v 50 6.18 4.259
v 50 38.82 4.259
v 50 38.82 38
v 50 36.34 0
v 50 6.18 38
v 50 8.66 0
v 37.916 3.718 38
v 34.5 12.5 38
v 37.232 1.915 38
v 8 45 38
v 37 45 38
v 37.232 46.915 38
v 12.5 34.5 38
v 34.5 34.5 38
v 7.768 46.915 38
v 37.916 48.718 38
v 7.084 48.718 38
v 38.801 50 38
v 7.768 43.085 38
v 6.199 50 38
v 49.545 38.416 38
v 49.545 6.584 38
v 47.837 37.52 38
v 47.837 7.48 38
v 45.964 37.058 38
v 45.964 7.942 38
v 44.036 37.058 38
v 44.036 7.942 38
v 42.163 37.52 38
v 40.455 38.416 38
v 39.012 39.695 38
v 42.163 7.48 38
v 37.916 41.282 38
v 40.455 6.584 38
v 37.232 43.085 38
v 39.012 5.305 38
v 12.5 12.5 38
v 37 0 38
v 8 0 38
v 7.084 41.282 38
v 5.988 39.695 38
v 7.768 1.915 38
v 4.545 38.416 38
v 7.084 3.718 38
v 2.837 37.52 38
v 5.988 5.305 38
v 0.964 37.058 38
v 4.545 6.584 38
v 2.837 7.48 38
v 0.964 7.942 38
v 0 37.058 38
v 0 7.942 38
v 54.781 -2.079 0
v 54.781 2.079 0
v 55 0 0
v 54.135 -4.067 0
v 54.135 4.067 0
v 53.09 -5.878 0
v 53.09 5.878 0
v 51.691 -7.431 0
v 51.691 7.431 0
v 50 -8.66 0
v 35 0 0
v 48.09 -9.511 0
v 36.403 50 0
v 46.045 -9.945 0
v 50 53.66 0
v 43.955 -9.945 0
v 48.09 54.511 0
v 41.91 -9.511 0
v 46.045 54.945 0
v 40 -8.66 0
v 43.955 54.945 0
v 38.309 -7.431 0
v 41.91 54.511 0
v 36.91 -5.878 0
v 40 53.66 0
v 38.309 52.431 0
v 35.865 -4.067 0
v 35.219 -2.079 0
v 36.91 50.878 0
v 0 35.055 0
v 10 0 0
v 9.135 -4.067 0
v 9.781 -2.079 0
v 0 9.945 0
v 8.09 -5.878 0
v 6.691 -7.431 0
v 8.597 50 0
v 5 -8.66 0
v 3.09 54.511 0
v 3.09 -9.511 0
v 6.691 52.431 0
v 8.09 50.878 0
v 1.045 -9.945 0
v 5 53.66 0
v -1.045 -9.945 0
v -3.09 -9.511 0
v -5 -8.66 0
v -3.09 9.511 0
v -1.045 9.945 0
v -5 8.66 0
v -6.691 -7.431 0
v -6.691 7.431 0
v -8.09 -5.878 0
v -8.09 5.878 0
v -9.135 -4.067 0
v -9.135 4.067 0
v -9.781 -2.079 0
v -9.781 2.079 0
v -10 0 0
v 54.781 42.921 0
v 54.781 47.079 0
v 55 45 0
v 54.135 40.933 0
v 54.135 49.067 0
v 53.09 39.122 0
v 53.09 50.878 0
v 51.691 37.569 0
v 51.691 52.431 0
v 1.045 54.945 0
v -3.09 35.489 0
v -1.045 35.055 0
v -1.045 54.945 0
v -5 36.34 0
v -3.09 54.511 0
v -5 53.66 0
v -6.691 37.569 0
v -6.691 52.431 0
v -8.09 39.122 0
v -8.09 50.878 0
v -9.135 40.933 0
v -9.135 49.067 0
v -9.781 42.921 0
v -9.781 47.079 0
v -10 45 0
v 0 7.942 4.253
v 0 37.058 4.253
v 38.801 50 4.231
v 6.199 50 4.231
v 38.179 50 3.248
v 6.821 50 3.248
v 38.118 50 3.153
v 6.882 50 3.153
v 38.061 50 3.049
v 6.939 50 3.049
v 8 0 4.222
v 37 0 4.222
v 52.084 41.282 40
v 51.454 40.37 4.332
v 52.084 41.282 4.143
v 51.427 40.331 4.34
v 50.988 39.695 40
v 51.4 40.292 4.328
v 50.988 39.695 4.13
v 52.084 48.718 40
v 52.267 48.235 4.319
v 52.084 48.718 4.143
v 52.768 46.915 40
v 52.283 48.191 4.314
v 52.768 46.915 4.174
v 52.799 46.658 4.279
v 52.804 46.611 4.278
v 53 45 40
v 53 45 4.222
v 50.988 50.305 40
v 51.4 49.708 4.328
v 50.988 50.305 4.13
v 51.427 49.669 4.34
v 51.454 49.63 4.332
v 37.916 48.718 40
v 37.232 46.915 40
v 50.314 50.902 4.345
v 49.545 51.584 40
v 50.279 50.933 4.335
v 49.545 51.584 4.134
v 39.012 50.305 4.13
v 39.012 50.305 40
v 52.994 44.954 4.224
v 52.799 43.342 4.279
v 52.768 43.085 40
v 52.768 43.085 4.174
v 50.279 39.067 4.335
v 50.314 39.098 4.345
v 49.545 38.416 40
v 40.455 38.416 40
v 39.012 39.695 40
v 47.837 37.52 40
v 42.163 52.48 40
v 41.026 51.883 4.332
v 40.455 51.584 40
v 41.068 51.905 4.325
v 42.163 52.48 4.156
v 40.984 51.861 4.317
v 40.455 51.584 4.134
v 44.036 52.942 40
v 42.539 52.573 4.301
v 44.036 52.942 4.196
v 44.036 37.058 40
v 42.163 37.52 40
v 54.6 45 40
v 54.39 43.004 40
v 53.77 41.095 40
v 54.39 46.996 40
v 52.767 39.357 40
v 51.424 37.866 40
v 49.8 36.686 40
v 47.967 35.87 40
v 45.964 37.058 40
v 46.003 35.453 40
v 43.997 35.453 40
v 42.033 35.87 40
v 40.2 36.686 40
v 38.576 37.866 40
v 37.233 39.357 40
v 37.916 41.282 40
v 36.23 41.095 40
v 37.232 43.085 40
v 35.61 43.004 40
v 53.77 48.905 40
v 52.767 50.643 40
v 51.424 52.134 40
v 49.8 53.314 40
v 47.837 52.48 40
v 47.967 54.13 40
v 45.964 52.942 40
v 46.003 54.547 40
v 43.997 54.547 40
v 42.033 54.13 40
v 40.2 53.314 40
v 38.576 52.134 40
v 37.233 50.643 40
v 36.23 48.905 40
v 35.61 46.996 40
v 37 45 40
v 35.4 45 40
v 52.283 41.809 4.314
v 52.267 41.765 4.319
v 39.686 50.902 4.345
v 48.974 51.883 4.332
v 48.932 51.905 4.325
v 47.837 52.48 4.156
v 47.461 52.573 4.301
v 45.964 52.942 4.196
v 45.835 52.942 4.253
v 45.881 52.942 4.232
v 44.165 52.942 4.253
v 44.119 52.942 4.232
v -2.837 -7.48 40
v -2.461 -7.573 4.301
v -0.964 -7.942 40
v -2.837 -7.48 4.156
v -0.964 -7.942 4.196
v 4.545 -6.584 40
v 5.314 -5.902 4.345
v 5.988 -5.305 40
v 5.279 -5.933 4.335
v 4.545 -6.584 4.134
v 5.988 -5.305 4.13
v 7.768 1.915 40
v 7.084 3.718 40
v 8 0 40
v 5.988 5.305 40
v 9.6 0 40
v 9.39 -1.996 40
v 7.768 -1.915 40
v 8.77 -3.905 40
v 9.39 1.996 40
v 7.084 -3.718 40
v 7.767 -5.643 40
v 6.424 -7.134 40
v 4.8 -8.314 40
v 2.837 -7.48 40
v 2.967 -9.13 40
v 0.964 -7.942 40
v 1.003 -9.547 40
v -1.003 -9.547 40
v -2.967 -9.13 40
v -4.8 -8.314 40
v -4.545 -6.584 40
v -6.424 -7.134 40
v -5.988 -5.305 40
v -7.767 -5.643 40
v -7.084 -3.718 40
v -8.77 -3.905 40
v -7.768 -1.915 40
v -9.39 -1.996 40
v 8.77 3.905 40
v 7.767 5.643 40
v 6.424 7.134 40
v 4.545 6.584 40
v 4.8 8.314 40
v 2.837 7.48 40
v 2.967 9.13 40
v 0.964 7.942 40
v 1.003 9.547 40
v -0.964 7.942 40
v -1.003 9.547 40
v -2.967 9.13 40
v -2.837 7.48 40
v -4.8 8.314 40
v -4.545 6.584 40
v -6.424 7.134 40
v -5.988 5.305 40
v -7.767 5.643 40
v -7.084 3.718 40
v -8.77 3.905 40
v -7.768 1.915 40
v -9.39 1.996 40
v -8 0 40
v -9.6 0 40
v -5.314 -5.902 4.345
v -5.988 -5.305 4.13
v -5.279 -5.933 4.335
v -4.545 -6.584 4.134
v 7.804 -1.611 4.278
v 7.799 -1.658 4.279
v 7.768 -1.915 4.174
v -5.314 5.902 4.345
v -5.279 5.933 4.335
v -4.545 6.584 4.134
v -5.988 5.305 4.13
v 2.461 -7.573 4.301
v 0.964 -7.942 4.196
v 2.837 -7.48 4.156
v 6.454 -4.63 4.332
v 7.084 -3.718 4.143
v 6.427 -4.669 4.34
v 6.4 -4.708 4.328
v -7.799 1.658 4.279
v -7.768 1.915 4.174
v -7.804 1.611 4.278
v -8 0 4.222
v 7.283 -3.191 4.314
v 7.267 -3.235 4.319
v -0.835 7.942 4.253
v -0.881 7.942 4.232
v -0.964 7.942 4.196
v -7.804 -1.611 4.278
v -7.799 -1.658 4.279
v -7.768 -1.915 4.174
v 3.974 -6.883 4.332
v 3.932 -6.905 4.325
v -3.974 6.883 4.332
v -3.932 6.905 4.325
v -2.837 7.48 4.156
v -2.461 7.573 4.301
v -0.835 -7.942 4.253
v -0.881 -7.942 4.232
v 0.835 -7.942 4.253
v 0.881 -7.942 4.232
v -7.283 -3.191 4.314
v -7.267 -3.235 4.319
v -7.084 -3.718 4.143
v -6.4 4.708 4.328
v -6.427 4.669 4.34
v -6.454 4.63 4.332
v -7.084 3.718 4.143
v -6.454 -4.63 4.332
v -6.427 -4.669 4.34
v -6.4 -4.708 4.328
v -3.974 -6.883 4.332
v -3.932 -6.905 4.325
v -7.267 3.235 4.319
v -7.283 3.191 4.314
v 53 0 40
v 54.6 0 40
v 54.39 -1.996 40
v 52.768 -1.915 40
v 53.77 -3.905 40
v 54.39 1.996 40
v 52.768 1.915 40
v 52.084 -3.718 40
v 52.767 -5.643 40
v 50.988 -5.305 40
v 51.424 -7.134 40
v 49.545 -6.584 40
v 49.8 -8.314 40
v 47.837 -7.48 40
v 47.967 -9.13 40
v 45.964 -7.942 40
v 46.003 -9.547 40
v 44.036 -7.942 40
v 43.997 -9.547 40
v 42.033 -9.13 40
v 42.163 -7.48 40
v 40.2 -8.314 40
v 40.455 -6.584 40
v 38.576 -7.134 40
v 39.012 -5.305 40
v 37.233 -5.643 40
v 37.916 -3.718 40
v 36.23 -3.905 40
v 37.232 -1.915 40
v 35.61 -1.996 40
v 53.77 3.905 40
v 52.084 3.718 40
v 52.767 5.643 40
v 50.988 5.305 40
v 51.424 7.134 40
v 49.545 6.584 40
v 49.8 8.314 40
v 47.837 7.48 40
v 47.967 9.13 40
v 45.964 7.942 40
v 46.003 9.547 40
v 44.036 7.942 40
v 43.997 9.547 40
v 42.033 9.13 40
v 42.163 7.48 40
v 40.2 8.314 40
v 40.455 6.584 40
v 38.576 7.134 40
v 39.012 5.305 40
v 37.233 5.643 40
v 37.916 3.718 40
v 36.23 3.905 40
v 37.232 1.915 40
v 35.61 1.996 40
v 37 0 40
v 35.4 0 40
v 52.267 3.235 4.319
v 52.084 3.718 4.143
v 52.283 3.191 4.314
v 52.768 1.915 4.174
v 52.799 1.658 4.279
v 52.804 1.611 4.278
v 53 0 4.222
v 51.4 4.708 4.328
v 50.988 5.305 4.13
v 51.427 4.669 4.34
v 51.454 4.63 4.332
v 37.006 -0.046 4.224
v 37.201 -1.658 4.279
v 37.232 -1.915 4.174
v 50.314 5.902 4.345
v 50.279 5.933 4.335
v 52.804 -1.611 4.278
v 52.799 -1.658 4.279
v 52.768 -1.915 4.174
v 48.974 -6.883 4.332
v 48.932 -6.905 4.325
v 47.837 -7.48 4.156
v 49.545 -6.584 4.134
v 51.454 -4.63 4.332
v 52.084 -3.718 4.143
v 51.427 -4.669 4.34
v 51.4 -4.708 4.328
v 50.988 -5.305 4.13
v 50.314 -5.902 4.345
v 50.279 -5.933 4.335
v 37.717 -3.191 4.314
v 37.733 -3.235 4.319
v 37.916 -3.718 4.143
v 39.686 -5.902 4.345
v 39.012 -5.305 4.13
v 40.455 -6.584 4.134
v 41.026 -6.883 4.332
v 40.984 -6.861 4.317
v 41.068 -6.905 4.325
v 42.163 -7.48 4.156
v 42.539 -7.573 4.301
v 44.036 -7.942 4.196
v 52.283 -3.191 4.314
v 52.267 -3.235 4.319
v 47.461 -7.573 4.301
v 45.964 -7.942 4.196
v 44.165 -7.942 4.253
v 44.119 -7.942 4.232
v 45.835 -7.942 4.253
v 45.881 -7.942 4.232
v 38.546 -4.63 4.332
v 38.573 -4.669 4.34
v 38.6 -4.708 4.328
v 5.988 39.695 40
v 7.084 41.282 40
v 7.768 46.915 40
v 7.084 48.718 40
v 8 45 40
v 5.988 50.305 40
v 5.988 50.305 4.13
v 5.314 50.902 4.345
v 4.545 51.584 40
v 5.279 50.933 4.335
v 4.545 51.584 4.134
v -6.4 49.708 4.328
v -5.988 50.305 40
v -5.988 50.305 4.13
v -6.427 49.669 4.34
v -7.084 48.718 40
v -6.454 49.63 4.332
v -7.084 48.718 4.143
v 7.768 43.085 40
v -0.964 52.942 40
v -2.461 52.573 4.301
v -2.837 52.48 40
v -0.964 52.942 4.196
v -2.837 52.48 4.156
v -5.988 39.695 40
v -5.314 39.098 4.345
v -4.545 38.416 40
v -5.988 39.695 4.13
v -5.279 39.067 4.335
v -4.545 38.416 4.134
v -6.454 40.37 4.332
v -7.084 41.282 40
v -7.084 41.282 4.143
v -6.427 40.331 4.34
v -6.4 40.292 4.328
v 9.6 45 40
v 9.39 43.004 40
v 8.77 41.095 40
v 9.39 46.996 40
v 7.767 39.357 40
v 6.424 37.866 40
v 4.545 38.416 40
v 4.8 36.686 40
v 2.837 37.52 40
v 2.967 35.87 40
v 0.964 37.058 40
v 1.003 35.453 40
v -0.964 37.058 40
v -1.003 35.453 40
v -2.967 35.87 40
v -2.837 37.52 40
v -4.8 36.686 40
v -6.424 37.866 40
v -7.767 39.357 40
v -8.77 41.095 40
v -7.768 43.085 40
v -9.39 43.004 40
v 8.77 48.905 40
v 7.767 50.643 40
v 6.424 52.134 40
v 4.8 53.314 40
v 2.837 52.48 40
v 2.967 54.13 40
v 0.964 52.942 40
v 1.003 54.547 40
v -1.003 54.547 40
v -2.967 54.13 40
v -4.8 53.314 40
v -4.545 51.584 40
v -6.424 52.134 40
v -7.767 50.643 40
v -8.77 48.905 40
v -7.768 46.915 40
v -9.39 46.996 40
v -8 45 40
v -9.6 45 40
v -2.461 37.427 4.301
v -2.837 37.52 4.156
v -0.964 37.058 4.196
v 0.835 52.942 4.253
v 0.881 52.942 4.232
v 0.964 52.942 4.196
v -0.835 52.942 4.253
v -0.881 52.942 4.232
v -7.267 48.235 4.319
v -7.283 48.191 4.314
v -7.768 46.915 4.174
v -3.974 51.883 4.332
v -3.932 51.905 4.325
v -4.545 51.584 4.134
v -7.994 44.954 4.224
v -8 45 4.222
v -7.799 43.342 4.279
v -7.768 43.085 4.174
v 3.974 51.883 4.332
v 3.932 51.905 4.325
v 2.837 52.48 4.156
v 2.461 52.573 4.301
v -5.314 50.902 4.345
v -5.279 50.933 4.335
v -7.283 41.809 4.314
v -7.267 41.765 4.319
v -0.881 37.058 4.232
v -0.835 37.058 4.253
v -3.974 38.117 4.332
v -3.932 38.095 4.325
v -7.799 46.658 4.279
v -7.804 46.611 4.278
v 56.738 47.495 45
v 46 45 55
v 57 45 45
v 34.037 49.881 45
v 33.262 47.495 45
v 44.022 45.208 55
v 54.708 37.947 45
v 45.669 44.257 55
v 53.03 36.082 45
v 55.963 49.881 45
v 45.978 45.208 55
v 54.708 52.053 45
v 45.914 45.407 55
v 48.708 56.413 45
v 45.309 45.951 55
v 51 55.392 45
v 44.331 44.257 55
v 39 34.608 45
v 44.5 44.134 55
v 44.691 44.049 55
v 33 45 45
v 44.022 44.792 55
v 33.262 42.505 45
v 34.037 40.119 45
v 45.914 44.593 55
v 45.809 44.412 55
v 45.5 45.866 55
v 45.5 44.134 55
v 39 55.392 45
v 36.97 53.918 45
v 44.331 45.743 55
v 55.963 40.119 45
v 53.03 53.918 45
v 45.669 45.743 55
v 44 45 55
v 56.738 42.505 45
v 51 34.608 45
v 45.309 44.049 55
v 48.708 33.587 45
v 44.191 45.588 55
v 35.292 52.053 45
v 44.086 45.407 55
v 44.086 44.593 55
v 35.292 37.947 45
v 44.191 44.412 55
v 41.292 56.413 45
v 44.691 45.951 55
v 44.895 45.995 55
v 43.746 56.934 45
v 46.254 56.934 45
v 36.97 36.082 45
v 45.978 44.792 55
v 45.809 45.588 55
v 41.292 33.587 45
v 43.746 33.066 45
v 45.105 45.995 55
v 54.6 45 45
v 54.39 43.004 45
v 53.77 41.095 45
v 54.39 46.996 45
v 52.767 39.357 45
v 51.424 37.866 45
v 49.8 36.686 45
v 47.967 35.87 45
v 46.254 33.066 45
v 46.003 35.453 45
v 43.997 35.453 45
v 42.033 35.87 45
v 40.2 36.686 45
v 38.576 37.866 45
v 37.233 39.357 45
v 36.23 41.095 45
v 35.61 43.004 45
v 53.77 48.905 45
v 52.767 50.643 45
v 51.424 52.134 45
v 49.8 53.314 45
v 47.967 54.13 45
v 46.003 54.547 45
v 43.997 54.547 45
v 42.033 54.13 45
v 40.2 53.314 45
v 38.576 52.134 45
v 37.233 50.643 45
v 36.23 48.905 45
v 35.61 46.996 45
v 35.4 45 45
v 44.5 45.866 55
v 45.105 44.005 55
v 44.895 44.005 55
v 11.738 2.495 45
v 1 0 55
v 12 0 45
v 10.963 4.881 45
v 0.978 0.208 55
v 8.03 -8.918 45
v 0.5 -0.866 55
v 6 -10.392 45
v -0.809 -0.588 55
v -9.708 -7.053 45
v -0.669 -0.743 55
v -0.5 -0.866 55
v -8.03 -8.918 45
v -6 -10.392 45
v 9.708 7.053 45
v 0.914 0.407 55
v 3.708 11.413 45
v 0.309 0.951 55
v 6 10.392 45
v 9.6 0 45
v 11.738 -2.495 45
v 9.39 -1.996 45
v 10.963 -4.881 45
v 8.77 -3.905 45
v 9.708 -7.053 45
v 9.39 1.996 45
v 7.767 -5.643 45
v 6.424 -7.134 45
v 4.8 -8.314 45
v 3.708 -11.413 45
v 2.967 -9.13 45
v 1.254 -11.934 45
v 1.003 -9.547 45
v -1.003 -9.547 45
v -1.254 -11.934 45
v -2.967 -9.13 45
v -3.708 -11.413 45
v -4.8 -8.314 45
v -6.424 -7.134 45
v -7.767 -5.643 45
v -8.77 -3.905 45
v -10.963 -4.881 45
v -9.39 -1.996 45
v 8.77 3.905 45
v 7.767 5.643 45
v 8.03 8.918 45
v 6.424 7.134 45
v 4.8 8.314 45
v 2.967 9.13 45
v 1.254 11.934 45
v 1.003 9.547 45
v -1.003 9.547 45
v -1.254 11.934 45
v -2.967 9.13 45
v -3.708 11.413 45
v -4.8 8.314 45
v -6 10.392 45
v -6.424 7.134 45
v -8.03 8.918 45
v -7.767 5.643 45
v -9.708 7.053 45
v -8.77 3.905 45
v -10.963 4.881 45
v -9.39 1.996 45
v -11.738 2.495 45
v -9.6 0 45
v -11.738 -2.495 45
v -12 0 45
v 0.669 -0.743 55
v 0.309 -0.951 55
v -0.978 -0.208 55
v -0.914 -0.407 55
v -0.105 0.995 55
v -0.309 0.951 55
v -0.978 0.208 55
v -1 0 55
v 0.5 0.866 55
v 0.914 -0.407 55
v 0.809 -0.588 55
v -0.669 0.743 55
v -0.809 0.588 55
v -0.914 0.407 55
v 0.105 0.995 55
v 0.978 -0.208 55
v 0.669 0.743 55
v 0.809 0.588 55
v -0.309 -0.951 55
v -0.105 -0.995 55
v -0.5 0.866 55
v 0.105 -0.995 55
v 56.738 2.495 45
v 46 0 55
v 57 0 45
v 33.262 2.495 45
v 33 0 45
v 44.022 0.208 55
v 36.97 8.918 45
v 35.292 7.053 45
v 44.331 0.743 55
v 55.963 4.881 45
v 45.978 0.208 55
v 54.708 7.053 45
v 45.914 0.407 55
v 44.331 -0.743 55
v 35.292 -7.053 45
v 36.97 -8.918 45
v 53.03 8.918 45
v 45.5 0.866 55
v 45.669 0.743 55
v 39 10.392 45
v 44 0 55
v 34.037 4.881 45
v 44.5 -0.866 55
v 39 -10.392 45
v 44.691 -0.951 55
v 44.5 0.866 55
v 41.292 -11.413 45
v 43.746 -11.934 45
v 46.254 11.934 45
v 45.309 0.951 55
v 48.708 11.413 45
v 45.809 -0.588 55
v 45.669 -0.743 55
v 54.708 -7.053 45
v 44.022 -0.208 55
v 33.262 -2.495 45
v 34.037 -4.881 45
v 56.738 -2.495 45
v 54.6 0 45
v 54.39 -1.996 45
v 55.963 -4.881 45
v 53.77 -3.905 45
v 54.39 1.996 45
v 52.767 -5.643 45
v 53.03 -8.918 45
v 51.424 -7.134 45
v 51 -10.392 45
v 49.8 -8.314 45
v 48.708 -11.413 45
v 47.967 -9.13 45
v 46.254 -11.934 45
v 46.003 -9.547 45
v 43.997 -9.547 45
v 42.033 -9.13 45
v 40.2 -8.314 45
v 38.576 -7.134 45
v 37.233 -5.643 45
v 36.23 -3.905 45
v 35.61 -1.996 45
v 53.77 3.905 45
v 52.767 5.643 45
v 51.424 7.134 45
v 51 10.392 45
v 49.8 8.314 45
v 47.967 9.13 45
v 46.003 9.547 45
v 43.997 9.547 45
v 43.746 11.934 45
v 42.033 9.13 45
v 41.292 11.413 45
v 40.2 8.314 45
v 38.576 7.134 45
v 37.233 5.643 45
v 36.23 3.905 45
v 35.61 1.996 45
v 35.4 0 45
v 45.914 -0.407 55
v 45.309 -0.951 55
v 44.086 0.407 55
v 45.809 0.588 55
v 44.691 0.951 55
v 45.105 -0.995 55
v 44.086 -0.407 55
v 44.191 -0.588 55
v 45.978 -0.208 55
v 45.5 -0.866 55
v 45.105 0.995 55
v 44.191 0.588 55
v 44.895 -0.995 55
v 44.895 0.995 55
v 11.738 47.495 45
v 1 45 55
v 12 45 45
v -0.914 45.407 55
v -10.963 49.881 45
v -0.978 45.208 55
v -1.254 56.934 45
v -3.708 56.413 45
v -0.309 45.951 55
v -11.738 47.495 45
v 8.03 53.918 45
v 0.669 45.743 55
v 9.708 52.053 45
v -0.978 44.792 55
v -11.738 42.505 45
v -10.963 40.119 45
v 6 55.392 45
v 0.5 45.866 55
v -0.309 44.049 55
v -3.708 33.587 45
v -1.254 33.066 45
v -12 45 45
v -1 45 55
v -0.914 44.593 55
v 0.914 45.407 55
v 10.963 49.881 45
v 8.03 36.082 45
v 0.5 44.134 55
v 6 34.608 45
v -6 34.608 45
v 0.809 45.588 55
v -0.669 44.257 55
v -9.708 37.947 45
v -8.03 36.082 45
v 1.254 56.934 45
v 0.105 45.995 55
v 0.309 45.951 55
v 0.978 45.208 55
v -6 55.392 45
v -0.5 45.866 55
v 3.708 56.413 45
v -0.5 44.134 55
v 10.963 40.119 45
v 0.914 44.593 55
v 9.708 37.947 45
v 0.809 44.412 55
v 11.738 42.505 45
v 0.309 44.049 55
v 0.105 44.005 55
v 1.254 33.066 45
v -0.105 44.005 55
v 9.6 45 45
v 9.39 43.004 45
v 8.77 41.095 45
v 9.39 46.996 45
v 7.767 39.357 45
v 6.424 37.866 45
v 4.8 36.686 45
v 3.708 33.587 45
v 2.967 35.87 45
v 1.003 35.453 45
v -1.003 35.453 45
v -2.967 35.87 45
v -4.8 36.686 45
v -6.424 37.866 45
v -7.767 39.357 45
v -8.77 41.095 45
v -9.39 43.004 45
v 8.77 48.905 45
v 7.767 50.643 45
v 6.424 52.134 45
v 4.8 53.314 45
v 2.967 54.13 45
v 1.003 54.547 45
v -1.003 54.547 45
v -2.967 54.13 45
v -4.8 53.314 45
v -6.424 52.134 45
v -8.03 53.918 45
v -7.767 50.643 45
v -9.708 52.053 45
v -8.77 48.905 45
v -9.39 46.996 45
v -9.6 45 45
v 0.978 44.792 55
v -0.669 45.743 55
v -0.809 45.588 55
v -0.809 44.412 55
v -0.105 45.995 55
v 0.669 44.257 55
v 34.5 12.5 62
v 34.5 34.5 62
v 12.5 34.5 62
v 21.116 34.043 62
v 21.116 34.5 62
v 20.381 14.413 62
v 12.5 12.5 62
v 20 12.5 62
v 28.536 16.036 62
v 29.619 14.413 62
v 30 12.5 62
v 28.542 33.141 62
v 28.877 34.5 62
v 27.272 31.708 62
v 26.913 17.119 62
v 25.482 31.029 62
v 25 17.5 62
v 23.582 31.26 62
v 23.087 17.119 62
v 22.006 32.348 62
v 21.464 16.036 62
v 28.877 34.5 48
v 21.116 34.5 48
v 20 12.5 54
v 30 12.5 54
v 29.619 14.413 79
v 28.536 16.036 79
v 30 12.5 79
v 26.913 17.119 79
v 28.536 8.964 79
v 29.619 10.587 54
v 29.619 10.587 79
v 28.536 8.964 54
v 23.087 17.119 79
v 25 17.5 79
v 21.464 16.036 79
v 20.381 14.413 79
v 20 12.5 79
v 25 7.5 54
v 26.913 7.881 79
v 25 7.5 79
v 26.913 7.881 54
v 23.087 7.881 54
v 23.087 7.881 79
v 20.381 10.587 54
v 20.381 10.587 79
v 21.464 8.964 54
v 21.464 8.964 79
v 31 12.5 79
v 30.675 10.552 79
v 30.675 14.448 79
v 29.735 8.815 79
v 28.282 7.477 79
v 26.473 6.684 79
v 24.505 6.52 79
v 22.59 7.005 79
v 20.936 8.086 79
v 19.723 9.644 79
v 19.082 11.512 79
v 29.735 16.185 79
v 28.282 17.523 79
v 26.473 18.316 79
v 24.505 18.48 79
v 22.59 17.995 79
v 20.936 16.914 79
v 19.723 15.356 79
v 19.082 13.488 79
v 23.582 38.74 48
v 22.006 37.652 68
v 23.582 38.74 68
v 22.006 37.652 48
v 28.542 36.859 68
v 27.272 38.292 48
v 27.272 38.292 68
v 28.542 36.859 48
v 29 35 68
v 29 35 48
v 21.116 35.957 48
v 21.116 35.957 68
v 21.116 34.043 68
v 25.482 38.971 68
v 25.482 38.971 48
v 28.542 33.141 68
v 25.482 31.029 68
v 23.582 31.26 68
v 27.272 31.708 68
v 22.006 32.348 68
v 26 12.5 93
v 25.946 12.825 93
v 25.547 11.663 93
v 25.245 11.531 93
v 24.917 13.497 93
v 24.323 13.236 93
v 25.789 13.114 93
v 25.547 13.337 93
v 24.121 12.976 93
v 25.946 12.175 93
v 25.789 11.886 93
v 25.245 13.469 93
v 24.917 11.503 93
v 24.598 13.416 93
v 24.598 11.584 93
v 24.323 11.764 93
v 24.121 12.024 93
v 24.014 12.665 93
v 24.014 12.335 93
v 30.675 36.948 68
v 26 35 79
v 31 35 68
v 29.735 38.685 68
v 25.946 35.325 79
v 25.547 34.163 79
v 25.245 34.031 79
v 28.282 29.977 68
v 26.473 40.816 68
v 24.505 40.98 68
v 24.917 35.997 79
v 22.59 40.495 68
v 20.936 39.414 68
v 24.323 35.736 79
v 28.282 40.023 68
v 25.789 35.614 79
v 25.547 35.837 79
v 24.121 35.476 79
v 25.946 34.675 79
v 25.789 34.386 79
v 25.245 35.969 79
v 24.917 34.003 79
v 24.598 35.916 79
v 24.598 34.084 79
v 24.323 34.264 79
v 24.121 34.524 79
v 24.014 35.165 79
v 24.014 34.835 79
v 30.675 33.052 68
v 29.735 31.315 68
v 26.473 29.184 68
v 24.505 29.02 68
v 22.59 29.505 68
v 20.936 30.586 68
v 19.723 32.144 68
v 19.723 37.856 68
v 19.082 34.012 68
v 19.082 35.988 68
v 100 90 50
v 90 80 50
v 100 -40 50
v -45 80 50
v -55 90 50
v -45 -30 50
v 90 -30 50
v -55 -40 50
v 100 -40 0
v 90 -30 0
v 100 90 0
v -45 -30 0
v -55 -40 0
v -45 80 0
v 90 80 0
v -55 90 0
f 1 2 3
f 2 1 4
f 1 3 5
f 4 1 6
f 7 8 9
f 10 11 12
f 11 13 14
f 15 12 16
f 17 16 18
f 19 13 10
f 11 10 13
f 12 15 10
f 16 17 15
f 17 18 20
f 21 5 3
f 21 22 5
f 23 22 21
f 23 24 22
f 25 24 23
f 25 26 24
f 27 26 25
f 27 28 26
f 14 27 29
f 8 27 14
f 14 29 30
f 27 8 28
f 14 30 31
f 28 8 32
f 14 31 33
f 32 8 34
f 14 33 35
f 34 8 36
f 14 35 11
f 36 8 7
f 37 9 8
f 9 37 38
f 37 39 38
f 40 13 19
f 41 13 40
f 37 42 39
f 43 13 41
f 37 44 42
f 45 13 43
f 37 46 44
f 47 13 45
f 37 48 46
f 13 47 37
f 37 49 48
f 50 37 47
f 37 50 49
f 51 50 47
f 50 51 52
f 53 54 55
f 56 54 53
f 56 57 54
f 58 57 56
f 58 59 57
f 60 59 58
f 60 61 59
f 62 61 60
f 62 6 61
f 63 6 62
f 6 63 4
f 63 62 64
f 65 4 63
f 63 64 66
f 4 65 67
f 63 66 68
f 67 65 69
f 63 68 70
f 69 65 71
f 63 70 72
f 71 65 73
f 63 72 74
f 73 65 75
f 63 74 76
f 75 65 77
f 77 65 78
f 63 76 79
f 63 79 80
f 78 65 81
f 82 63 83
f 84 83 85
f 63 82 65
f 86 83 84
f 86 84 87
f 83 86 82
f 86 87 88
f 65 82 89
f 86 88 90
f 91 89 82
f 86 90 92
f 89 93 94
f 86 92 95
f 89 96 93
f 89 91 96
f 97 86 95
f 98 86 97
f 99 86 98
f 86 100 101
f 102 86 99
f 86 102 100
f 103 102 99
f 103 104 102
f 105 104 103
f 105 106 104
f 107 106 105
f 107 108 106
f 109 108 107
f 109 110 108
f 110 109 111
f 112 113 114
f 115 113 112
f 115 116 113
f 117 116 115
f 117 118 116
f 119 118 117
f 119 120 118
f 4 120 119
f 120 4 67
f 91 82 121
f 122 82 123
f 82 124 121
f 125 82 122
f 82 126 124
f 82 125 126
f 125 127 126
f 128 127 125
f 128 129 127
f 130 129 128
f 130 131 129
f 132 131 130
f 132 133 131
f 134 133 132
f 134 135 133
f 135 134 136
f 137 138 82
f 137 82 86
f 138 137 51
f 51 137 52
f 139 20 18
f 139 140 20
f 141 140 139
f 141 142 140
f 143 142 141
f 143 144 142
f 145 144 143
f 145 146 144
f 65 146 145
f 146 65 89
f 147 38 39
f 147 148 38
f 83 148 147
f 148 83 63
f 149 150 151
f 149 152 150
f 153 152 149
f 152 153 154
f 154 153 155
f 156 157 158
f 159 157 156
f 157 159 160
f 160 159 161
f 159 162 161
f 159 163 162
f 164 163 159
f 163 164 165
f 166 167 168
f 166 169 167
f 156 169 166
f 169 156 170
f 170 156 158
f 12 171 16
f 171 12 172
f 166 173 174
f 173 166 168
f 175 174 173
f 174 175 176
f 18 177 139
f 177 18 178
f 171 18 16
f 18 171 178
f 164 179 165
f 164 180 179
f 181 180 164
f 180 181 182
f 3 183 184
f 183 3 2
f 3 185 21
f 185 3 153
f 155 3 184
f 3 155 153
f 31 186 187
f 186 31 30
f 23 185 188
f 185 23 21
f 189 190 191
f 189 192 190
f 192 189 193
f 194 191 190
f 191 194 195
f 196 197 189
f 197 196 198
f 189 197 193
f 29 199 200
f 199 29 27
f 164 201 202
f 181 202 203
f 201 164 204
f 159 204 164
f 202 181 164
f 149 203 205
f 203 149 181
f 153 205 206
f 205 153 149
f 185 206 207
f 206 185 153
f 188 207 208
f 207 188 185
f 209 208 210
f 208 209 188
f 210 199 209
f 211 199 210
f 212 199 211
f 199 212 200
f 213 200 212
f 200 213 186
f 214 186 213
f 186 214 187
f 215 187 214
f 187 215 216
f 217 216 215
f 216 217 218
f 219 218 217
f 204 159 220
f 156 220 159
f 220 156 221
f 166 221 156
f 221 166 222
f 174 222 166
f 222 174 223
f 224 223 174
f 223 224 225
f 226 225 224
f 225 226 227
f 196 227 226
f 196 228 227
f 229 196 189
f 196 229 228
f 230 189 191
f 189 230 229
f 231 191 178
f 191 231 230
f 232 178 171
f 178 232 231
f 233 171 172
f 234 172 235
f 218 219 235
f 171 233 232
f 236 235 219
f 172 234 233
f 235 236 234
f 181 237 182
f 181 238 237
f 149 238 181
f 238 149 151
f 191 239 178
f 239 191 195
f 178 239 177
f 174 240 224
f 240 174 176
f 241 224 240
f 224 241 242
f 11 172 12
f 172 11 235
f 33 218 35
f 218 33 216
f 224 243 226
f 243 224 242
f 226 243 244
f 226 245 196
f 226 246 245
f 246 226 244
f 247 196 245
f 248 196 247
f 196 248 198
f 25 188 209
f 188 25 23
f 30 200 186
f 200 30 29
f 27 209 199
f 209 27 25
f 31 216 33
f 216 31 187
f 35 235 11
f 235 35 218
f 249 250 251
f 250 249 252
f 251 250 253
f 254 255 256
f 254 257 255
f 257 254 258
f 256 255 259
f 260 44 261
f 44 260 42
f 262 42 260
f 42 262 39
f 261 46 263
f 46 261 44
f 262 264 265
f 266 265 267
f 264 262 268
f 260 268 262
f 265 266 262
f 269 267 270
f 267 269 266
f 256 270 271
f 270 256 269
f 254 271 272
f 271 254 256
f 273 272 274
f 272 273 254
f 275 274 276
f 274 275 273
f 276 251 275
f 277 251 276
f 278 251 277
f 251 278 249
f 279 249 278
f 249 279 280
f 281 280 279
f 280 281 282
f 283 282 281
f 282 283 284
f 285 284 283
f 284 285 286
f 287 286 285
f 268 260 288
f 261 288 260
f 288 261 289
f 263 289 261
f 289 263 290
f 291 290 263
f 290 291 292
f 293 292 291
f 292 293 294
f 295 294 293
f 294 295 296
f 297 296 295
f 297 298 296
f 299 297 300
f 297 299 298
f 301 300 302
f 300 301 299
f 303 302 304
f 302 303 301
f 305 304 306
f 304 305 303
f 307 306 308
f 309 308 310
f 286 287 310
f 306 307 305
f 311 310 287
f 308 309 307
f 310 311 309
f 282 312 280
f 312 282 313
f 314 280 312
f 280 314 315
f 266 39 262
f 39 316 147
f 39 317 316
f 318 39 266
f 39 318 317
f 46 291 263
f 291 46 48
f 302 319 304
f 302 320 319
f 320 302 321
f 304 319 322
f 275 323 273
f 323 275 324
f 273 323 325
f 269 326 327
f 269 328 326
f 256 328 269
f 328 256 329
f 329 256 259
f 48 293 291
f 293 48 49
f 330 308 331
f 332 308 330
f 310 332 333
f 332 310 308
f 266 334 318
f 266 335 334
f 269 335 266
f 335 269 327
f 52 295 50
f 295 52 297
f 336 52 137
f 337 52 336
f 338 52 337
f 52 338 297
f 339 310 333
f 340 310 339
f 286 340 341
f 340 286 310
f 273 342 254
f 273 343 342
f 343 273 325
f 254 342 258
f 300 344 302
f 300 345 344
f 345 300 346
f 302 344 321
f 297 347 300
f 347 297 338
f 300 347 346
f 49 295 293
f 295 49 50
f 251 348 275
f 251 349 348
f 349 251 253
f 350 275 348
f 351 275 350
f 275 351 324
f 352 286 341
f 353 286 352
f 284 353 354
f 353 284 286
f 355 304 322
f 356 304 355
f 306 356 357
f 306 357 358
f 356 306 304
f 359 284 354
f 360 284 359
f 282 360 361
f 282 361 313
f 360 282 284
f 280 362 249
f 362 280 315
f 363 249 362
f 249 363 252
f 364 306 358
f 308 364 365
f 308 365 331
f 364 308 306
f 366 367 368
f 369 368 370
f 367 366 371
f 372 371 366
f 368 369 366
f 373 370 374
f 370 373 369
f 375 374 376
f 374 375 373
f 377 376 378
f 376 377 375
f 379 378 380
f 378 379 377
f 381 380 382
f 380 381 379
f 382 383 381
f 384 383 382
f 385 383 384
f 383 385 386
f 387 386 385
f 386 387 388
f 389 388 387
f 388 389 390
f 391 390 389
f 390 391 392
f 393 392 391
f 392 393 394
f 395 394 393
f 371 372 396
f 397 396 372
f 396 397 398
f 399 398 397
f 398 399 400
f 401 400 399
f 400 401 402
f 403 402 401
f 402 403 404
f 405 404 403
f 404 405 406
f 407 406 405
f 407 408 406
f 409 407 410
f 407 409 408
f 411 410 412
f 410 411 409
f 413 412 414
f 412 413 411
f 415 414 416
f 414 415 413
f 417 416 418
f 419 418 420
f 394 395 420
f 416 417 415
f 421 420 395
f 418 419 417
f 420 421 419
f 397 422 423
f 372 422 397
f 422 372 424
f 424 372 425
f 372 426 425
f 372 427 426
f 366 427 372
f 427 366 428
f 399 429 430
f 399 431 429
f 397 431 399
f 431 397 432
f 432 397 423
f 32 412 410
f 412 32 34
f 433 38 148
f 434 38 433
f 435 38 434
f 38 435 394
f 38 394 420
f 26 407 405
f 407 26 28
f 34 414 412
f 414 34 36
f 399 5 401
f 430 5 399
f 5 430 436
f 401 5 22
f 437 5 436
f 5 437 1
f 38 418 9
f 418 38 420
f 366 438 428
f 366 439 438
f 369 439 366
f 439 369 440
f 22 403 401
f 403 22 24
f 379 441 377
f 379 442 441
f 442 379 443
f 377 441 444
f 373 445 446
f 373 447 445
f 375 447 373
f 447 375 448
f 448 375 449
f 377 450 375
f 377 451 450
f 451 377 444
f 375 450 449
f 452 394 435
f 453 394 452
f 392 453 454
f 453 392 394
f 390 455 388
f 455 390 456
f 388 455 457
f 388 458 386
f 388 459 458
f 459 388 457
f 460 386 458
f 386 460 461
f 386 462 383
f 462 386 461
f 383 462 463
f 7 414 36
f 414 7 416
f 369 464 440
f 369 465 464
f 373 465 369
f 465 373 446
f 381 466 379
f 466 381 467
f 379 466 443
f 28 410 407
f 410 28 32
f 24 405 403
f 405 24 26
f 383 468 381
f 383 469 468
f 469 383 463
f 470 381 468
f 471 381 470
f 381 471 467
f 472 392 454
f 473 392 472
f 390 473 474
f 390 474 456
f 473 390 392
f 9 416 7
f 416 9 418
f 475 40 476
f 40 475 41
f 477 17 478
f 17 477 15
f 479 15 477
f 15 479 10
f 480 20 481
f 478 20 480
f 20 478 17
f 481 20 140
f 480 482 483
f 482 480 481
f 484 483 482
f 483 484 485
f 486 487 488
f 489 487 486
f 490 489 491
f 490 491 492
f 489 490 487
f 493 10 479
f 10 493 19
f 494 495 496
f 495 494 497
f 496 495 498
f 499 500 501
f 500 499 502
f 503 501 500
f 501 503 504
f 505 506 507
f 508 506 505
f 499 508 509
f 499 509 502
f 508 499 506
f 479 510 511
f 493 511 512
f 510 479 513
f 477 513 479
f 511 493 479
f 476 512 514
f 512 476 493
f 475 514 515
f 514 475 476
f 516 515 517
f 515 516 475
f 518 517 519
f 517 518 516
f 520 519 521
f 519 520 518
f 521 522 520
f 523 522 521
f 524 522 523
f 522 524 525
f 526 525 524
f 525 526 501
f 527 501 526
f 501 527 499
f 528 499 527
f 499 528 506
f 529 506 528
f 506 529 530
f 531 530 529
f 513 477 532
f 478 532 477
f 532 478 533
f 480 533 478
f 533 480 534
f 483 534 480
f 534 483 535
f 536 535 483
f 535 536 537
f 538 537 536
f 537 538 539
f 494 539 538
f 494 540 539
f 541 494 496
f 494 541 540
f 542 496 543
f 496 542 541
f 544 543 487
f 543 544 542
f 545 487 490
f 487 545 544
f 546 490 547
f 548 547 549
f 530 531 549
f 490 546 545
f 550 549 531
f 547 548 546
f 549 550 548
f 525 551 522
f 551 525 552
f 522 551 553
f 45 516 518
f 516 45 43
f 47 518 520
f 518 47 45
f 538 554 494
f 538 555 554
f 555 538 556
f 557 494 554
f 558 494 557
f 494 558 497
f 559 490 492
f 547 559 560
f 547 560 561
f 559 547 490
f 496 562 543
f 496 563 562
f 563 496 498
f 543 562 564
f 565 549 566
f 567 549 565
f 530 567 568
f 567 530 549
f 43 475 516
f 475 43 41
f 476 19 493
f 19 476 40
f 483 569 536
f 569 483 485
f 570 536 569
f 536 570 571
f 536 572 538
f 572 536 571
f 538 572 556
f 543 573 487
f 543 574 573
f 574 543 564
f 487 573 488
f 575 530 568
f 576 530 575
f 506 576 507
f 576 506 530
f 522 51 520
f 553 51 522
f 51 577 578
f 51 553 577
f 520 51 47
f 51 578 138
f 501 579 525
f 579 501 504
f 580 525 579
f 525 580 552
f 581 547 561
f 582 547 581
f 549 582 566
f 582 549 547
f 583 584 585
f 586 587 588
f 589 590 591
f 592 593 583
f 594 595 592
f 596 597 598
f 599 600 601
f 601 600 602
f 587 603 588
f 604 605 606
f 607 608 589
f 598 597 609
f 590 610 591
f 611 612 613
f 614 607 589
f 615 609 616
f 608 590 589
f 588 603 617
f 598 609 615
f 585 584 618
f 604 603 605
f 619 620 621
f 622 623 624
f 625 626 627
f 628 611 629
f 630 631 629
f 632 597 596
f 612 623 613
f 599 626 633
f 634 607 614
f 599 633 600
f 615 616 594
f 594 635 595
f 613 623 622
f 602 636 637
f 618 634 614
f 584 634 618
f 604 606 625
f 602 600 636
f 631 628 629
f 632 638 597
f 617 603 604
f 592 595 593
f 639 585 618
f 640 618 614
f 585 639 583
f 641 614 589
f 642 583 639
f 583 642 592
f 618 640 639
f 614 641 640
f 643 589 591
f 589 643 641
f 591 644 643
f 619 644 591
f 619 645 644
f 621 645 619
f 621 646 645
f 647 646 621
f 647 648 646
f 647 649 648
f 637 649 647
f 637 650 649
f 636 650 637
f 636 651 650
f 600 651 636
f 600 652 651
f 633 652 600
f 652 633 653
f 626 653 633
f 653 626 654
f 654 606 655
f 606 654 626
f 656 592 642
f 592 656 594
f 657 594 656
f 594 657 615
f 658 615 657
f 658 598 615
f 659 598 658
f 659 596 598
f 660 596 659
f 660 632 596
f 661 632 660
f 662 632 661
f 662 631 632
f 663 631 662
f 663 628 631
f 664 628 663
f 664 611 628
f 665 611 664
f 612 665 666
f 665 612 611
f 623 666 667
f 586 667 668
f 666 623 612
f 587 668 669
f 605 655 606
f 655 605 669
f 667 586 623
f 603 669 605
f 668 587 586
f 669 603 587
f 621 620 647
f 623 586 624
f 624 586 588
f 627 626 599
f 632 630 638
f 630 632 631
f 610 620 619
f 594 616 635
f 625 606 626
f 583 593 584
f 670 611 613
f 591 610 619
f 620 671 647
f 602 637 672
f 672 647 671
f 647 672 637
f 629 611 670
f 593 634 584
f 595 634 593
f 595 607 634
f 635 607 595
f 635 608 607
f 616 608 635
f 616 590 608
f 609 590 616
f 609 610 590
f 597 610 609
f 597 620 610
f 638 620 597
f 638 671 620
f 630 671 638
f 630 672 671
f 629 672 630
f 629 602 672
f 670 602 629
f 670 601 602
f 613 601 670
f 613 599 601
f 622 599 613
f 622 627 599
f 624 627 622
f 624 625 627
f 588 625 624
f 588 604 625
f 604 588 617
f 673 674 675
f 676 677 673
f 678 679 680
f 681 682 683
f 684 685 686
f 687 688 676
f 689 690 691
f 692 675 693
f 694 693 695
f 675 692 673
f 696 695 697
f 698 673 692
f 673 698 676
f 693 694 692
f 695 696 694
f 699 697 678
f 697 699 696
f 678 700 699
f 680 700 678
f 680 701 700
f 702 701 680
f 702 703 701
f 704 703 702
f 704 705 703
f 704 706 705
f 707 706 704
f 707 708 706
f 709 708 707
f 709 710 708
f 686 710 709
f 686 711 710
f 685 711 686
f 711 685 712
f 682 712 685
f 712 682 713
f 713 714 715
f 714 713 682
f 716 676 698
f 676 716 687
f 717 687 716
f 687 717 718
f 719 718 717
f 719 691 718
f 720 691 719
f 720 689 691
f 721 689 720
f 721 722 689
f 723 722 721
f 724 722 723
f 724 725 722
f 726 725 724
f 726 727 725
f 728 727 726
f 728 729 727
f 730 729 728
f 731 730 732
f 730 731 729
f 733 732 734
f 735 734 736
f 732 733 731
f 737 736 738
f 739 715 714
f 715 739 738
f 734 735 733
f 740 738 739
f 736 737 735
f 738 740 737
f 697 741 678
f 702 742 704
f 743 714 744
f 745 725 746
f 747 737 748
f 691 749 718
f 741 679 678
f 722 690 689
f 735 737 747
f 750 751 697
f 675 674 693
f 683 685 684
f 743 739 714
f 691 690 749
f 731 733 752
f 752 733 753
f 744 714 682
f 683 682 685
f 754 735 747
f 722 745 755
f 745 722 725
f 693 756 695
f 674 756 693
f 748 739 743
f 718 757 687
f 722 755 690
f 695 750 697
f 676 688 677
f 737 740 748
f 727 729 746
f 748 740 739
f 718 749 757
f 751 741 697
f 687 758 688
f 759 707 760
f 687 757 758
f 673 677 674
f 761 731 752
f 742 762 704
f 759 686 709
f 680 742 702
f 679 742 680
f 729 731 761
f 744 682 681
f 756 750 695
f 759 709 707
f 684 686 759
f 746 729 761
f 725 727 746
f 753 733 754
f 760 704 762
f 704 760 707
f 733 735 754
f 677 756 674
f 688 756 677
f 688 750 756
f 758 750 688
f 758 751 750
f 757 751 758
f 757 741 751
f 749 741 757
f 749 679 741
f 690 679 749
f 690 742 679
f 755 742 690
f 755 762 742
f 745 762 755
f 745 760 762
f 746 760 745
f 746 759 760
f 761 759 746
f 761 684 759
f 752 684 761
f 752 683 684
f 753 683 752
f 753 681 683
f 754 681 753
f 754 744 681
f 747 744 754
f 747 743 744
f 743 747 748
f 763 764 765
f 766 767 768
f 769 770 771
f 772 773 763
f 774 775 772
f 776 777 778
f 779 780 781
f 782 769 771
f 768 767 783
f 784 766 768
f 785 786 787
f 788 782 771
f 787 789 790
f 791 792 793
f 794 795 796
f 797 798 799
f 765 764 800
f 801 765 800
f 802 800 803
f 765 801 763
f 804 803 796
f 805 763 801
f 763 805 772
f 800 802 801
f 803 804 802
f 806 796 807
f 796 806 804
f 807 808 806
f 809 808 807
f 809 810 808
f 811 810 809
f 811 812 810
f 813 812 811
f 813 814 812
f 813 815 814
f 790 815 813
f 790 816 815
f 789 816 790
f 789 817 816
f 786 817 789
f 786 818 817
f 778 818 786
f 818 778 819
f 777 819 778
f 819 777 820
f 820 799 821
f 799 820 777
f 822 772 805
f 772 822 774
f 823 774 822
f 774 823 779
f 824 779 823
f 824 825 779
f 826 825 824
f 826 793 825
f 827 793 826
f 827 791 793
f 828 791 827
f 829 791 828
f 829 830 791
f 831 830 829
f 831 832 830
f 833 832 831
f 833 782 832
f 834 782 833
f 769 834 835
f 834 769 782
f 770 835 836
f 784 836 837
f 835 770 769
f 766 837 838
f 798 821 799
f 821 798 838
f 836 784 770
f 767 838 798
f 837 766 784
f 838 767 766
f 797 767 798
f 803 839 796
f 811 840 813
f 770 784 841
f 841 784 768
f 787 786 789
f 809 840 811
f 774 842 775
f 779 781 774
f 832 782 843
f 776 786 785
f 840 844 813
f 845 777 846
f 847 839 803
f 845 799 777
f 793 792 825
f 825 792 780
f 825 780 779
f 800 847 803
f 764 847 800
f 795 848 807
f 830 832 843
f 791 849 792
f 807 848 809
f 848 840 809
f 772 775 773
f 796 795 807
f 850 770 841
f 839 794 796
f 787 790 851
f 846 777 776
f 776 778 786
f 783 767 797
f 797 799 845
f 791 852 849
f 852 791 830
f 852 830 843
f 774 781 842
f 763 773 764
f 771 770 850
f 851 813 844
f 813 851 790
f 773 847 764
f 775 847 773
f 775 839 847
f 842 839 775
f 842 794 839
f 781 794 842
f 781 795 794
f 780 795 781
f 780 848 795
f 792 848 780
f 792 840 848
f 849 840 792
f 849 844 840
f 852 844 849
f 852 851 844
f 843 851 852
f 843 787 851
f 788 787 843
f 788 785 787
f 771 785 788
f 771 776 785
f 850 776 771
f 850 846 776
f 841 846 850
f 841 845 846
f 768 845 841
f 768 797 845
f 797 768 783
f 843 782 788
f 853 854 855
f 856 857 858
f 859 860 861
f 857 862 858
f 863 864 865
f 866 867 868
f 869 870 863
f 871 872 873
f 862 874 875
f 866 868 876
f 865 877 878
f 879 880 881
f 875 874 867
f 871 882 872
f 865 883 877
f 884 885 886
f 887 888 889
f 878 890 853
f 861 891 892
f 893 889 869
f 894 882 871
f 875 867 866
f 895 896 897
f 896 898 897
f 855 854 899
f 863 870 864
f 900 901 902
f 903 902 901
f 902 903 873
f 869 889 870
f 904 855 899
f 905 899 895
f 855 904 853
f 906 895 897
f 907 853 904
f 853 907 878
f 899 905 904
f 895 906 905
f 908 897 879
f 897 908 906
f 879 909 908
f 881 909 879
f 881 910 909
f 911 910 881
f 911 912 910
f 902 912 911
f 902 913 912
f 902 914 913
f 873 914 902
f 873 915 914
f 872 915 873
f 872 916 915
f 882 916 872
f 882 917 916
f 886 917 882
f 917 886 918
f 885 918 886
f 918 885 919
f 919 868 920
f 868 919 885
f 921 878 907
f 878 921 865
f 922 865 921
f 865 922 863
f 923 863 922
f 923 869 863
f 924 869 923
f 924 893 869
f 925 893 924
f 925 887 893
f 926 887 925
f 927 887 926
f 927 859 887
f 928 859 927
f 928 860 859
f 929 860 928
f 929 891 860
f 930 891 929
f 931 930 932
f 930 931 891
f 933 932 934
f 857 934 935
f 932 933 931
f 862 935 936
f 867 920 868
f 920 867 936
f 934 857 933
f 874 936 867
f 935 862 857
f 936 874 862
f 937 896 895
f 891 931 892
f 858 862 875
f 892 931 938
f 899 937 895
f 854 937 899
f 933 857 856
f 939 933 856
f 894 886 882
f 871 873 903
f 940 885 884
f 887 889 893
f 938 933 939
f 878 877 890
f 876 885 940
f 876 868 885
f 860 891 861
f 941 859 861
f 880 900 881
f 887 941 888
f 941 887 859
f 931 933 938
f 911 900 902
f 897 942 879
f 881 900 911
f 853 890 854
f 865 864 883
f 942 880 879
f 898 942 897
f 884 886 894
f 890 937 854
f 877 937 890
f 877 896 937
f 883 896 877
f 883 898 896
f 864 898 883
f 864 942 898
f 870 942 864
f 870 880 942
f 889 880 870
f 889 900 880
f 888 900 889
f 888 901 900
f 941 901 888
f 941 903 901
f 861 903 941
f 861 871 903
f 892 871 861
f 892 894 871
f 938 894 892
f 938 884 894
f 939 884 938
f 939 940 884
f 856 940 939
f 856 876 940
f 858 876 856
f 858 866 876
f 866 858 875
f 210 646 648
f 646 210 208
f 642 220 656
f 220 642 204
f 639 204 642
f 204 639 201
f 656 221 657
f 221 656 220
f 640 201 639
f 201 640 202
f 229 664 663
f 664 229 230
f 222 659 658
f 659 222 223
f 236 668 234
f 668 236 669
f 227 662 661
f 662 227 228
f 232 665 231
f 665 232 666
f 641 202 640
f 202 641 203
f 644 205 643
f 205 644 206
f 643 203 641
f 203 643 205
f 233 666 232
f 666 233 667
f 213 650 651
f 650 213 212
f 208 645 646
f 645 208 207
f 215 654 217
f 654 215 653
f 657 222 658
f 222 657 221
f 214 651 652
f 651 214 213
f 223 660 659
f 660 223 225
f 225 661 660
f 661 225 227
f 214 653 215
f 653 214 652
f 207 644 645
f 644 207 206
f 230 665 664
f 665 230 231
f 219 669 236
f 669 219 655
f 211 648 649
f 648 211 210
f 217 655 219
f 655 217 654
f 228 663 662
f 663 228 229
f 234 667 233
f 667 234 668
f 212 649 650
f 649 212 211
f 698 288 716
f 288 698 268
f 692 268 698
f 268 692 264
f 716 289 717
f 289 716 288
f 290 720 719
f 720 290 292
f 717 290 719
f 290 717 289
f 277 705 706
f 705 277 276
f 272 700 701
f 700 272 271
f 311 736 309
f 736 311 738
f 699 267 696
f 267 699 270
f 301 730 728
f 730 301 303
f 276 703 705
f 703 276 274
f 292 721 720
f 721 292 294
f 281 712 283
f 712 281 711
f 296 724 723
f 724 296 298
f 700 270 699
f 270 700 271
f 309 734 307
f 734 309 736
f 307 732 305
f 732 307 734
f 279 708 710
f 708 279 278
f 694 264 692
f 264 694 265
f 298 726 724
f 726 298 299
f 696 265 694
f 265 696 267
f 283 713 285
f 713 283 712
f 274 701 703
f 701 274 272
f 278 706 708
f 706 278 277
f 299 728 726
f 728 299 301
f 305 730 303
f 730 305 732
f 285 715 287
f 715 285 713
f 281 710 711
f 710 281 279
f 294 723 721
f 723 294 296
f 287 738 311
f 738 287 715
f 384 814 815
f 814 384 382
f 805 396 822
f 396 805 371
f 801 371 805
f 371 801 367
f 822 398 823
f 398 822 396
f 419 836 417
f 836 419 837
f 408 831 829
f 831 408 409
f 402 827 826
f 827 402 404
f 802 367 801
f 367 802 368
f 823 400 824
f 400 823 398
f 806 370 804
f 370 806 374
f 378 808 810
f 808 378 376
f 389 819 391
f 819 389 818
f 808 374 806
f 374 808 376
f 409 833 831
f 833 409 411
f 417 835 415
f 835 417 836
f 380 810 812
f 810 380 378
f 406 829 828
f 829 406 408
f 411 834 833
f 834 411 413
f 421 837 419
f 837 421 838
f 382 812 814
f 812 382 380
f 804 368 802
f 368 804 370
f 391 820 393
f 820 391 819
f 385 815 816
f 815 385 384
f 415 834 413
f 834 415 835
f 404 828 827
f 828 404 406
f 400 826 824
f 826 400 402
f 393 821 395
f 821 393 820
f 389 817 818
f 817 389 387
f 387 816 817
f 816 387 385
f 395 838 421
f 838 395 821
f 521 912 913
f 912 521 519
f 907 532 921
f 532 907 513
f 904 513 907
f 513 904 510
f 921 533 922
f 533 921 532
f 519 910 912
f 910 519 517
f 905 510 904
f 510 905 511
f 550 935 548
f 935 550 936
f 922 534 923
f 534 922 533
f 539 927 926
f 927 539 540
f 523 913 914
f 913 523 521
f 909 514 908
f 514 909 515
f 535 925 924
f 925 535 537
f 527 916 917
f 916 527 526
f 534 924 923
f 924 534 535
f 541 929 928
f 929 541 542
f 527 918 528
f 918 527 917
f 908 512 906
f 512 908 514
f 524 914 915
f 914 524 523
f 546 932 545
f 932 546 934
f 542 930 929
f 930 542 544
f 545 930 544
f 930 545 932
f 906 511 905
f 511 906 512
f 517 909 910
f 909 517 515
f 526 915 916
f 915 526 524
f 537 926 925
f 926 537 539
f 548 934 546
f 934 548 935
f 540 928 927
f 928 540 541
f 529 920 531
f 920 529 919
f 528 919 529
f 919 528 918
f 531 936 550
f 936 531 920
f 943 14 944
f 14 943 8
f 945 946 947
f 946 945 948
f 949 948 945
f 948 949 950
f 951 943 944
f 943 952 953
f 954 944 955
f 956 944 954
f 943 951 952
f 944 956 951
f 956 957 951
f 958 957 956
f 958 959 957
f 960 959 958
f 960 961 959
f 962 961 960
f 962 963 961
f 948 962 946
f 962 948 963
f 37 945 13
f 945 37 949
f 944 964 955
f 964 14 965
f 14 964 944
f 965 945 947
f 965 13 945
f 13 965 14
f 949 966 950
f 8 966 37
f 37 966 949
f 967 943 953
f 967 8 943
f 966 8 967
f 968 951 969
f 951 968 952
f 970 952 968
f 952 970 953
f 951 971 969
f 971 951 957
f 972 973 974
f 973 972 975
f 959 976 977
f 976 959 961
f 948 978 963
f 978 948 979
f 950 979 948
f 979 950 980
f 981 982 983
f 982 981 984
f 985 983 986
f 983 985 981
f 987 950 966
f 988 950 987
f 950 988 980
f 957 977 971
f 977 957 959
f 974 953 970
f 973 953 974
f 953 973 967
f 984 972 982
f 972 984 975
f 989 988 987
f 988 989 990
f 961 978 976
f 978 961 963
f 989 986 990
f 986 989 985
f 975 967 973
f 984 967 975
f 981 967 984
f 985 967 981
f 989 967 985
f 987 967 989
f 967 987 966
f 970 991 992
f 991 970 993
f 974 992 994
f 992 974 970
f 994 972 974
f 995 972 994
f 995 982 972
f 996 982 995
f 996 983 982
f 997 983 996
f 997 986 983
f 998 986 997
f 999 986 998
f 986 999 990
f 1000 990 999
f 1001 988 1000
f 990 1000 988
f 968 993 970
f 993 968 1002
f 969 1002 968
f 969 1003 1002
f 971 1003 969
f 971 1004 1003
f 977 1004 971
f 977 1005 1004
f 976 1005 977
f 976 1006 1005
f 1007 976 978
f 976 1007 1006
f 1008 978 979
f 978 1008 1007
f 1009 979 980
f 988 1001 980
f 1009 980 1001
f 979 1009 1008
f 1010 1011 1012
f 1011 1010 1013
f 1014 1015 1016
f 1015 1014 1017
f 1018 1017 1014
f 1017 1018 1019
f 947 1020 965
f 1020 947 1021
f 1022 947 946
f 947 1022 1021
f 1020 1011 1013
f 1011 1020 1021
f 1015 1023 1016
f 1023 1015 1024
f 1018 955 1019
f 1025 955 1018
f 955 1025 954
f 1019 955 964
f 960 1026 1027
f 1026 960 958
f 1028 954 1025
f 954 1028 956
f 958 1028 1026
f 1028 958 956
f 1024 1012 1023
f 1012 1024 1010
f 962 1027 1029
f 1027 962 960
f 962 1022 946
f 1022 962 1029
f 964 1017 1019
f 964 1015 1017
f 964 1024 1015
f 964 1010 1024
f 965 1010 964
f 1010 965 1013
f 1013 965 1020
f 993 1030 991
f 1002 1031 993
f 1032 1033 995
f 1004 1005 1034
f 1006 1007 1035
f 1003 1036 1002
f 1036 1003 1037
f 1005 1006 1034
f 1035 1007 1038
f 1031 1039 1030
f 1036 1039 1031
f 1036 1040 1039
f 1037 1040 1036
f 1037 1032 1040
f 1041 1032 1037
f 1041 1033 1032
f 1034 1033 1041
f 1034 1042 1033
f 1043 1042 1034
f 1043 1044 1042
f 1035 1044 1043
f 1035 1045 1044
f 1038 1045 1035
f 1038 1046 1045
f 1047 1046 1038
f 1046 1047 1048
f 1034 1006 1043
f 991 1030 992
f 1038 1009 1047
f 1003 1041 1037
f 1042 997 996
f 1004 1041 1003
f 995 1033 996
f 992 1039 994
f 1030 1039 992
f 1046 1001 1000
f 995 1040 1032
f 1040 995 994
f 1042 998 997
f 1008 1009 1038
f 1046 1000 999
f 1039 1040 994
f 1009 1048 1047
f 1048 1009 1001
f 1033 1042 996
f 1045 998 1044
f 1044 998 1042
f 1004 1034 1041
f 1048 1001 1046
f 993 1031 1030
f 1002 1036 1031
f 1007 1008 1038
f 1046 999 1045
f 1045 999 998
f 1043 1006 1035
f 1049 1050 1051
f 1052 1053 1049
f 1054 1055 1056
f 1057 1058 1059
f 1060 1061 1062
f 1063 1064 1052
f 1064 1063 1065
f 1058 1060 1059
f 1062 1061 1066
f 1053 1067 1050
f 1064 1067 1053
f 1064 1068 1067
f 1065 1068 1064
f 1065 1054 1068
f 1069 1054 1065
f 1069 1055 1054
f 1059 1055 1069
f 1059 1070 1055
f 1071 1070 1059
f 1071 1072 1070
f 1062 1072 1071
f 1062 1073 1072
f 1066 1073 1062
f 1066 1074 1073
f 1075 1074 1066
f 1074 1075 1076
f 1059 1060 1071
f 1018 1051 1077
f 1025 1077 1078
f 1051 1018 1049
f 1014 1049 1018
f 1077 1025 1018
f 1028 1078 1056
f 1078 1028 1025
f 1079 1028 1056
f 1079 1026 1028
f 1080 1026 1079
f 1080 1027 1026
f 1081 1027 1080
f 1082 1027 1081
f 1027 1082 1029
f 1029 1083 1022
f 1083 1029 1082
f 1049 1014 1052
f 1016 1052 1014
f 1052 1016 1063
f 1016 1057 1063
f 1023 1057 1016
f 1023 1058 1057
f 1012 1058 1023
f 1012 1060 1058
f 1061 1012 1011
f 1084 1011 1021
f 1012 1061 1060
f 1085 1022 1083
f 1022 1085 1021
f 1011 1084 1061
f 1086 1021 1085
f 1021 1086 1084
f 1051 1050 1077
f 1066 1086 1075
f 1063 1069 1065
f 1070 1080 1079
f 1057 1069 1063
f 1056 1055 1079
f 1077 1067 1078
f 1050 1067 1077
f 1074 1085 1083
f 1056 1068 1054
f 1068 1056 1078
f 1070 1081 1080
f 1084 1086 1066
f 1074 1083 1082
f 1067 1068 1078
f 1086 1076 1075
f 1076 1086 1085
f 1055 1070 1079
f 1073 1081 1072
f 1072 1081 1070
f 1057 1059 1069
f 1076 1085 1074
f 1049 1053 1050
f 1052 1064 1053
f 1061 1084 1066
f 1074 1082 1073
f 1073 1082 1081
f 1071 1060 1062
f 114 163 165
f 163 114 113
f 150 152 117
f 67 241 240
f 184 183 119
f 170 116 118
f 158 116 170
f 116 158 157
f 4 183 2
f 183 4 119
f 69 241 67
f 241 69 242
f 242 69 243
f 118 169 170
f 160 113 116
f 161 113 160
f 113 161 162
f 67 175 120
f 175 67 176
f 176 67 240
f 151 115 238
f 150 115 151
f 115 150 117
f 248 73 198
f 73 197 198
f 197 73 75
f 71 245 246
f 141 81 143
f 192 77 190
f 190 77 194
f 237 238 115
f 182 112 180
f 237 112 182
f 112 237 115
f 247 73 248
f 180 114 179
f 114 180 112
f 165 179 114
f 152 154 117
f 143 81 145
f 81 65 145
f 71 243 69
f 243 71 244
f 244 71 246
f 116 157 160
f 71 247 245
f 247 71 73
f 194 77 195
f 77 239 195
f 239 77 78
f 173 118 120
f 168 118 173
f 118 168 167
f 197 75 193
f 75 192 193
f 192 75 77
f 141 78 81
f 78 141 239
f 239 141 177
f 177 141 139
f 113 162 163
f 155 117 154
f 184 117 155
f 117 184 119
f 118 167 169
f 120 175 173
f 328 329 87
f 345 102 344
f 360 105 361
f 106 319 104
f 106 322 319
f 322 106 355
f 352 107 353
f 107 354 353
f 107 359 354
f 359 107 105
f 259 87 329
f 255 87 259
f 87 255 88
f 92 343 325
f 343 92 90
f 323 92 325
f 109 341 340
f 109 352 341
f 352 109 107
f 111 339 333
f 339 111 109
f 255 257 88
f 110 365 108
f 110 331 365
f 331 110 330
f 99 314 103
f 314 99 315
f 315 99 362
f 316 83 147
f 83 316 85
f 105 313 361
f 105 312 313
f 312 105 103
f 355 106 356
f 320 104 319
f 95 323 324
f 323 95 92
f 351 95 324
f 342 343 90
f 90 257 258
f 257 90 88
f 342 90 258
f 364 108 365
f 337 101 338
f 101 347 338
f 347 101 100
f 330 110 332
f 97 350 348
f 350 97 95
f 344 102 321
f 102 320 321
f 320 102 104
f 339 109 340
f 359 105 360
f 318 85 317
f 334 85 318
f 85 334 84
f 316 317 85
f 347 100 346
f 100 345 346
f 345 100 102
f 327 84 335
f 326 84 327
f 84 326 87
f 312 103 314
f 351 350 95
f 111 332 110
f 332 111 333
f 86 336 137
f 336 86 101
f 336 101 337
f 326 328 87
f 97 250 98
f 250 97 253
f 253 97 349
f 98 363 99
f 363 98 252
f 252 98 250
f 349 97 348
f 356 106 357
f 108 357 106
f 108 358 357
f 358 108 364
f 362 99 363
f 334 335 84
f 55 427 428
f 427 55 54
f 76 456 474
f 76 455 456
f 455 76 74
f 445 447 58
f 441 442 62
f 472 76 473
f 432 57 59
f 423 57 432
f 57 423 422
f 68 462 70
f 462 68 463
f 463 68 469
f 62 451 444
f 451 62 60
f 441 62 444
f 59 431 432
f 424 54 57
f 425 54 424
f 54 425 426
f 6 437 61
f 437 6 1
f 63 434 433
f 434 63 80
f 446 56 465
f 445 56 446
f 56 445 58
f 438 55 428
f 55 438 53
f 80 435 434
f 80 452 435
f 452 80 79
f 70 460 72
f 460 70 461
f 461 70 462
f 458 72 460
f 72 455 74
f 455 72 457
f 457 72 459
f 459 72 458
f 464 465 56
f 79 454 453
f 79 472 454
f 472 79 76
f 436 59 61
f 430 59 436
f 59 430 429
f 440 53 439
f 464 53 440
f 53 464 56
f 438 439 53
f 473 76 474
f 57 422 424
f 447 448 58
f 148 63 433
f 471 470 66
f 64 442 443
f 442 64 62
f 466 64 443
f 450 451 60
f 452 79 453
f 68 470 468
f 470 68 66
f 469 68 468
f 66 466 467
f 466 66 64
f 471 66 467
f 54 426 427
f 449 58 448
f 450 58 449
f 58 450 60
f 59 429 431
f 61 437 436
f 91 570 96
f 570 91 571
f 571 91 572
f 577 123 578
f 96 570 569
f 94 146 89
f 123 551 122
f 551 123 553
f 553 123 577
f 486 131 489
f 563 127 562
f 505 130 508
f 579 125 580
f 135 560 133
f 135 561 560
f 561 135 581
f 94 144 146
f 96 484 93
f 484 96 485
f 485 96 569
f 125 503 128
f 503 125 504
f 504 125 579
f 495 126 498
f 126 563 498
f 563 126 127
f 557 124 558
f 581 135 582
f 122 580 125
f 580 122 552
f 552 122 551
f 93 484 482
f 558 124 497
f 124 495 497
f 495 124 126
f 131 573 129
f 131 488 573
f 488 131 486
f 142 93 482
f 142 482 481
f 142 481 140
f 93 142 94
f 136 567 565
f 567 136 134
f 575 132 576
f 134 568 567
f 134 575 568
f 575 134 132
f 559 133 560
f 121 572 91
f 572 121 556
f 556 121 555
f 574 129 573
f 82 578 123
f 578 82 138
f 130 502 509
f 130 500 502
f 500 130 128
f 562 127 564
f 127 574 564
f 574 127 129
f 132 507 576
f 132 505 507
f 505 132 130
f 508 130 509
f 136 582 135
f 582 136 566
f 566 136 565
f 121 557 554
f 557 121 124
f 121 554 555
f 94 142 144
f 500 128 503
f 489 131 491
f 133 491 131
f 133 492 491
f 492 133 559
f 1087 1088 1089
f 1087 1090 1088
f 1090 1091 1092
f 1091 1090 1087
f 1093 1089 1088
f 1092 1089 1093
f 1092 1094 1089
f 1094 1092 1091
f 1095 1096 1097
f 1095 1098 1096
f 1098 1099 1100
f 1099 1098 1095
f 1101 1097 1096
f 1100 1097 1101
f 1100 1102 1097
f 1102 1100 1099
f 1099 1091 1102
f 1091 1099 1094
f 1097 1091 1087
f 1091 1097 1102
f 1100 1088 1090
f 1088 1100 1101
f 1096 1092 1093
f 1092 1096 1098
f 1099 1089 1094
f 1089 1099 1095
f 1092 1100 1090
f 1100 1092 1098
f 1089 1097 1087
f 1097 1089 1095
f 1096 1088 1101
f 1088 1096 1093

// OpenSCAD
x = 8;   // diamentro cilindro
tc = 40; // tamanho cilindro
ac = 10; // altura cone maior
dc = 12; // diametro cone maior
y = 0;   // posicao 1
z = 45;  // posicao 2

// cubo maior
translate([0,0,0]) cube([50,50,38]);

// torres
translate([z,z,0]) cylinder(tc,x,x);
translate([y,y,0]) cylinder(tc,x,x);
translate([z,y,0]) cylinder(tc,x,x);
translate([y,z,0]) cylinder(tc,x,x);

// cone das torres
translate([z,z,tc+acab]) cylinder(ac,dc);
translate([y,y,tc+acab]) cylinder(ac,dc);
translate([z,y,tc+acab]) cylinder(ac,dc);
translate([y,z,tc+acab]) cylinder(ac,dc);

// cabine torres
acab = 5; // altura cabine
translate([z,z,tc]) cylinder(acab,9.6,9.6);
translate([y,y,tc]) cylinder(acab,9.6,9.6);
translate([z,y,tc]) cylinder(acab,9.6,9.6);
translate([y,z,tc]) cylinder(acab,9.6,9.6);

// cubo menor
translate ([12.5,12.5,38]) cube([22,22,24]);

// torres menores
translate([25,12.5,54]) cylinder(25,5,5);
translate([25,35,48]) cylinder(22,4,4);

// cone das torres menores
translate([25,12.5,79]) cylinder(14,6);
translate([25,35,68]) cylinder(11,6);

// pé das torres
translate([z,z,0]) cylinder(19,10);
translate([y,y,0]) cylinder(19,10);
translate([z,y,0]) cylinder(19,10);
translate([y,z,0]) cylinder(19,10);


// muralha 
translate([-55,80,0]) cube([150,10,50]);
translate([-55,-40,0]) cube([150,10,50]);
translate([-55,-40,0]) cube([10,130,50]);
translate([90,-40,0]) cube([10,130,50]);
